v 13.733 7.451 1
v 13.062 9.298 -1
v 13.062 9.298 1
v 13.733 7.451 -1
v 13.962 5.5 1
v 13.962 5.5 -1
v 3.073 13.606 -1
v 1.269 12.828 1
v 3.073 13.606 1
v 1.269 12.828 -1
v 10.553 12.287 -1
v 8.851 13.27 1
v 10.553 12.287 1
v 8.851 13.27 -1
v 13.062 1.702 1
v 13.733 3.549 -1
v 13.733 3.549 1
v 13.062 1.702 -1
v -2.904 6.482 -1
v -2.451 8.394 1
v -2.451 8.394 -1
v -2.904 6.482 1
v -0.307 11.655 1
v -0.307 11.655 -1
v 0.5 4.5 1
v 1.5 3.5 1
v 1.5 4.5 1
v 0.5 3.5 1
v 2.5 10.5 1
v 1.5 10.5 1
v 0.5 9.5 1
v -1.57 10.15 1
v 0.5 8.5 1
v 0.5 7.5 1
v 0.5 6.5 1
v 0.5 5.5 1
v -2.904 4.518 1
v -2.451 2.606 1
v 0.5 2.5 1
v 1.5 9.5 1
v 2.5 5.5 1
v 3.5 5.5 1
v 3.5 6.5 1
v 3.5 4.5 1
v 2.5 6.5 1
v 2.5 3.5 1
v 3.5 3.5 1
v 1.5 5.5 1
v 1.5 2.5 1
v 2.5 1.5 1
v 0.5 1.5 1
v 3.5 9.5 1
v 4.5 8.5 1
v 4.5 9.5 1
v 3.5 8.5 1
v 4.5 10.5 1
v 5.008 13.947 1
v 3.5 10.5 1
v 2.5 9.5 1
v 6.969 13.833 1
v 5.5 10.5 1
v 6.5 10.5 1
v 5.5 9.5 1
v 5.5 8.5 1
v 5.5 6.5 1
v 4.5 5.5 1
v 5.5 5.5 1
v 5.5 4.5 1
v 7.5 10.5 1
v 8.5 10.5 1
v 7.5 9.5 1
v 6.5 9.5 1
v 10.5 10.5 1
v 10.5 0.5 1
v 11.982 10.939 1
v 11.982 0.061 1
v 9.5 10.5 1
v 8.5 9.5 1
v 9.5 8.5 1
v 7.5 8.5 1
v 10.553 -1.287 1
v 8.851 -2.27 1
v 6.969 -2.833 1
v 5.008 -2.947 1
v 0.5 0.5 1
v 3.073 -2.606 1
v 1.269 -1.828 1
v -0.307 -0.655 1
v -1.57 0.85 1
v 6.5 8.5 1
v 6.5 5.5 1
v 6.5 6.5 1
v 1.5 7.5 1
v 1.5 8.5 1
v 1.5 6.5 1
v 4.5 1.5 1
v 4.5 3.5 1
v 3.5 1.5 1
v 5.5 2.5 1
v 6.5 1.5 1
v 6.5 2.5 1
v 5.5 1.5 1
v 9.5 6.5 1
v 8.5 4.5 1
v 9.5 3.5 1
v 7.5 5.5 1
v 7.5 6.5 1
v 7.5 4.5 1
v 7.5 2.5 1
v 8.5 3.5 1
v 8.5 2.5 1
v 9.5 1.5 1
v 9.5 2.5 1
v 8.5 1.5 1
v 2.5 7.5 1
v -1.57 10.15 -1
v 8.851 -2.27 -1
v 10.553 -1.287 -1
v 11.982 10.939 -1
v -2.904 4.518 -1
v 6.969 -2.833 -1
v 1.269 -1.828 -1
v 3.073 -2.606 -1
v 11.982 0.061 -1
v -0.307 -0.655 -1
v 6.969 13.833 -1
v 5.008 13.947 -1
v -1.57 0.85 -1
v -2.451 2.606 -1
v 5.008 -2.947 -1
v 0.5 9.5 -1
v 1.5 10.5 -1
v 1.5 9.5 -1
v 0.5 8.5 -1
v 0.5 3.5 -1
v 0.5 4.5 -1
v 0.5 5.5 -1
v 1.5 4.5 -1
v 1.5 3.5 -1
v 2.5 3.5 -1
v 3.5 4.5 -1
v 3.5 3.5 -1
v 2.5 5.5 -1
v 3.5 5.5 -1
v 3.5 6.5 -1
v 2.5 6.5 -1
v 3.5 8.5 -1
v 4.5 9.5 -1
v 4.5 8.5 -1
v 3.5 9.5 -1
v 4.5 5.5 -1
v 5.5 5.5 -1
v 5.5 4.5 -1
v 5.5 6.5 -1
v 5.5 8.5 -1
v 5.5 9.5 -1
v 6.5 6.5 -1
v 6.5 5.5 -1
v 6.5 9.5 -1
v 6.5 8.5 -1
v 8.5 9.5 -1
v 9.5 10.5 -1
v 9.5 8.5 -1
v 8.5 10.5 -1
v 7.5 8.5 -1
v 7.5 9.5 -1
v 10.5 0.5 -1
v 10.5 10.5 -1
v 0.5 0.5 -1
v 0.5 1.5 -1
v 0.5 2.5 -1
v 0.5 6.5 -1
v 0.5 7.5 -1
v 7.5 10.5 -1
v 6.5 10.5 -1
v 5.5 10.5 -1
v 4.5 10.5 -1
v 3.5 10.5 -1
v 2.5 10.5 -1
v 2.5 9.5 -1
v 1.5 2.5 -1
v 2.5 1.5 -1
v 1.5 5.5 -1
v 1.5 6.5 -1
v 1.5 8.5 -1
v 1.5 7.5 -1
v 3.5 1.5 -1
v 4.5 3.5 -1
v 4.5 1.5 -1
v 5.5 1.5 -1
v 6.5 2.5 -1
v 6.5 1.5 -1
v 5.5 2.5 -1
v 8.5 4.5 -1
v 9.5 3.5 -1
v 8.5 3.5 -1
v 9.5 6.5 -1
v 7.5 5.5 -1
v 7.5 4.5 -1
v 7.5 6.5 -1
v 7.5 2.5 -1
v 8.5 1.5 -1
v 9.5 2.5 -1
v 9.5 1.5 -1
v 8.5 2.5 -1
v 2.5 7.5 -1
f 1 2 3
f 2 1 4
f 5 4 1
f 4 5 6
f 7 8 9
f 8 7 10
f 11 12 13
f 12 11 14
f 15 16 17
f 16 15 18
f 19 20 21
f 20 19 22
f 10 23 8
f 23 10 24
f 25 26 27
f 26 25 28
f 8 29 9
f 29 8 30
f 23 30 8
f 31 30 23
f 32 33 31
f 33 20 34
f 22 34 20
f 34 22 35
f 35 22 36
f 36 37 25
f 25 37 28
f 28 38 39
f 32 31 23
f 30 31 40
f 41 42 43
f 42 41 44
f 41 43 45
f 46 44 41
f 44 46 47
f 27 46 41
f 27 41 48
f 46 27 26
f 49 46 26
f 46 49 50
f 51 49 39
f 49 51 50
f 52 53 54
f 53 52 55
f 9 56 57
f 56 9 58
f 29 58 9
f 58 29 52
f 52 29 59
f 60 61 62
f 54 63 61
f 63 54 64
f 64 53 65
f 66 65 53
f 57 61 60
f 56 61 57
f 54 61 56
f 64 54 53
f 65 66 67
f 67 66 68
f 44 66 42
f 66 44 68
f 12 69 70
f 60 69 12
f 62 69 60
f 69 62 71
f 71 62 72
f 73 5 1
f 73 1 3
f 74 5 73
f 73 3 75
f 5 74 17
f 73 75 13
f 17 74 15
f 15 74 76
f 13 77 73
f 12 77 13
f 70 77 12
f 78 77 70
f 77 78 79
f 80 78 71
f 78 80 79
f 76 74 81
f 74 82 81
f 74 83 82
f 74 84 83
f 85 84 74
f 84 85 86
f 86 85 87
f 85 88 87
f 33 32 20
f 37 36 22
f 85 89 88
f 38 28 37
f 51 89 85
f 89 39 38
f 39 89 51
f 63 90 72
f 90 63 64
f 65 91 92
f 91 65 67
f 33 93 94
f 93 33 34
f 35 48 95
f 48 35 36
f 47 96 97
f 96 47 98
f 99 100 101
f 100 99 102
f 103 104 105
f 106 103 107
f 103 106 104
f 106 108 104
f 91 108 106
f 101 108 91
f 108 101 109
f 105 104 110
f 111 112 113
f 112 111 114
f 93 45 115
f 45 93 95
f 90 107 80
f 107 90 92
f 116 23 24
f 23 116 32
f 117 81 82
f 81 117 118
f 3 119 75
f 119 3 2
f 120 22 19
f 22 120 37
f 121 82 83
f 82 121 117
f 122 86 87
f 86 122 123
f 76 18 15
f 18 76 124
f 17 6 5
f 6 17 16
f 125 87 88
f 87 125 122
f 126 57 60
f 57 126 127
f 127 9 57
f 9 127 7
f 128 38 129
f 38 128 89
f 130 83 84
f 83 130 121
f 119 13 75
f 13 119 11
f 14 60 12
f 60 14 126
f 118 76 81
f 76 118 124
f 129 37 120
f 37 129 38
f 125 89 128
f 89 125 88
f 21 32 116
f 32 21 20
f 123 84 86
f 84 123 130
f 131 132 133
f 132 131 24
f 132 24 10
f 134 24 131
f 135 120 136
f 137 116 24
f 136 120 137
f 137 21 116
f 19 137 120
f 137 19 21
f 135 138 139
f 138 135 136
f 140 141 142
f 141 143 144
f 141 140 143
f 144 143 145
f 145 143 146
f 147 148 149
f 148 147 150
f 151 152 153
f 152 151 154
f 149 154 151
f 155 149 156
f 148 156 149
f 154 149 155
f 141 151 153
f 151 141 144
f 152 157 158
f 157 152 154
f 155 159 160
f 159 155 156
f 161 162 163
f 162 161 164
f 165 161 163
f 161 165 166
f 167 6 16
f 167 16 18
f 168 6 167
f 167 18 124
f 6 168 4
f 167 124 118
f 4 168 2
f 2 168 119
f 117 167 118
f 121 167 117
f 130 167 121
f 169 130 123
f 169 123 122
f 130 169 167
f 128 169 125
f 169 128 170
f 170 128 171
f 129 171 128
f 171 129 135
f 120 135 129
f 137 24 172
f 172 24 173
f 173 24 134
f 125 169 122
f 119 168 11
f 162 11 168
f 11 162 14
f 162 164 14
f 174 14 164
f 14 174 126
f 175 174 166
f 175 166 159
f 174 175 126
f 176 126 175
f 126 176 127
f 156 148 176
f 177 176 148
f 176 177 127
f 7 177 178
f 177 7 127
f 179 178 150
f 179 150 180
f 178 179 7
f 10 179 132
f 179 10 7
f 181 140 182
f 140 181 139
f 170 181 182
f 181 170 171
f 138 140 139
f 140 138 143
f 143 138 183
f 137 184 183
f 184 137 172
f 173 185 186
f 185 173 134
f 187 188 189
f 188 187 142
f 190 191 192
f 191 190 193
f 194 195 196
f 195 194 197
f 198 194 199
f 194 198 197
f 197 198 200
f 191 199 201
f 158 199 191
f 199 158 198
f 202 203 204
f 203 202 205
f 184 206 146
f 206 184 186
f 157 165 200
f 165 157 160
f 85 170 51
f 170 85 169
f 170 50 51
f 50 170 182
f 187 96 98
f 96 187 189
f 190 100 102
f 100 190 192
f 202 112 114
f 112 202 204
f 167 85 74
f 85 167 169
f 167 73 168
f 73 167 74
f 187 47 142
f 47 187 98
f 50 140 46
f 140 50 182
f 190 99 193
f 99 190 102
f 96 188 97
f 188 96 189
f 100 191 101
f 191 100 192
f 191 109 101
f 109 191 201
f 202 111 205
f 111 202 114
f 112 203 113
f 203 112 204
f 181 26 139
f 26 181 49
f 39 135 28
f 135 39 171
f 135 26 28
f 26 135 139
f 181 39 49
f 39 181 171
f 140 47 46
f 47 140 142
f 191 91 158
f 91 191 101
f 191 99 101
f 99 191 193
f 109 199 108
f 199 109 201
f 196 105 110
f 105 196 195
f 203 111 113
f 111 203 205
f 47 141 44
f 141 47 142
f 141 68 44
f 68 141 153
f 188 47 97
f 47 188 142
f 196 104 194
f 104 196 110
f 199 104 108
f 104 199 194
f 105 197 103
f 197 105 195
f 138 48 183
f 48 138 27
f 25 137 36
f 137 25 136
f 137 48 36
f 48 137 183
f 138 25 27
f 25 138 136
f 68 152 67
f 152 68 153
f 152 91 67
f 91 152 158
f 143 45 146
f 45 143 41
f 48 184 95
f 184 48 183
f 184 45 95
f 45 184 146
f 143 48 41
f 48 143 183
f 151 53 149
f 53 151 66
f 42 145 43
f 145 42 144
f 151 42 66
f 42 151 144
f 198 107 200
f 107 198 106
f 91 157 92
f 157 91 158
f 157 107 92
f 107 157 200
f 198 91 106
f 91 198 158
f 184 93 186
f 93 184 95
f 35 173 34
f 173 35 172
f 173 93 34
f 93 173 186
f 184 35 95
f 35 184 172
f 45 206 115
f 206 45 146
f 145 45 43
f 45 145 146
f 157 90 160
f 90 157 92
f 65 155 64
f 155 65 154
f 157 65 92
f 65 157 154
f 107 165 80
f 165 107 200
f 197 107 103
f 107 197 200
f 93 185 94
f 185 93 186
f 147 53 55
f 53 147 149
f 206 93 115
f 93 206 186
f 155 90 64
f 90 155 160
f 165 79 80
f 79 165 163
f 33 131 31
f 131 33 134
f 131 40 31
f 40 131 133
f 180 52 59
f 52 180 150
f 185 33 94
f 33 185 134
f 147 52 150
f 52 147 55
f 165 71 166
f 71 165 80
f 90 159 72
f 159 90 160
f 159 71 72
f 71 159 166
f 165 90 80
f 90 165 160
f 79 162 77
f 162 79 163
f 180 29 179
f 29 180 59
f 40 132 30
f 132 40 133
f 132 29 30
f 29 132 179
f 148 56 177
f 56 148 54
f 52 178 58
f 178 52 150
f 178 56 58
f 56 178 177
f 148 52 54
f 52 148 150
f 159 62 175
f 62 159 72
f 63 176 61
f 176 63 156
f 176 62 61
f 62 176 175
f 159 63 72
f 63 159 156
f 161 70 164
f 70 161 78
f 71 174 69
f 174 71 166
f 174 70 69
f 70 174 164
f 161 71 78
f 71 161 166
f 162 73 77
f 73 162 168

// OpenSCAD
rotate([0,0,0])difference(){translate([5.5,5.5,0])  cylinder(r=8.46153846153846,h=2, center=true);
translate([1,1,0])  cube(size = [1,1,2], center=true);
translate([2,1,0])  cube(size = [1,1,2], center=true);
translate([3,1,0])  cube(size = [1,1,2], center=true);
translate([4,1,0])  cube(size = [1,1,2], center=true);
translate([5,1,0])  cube(size = [1,1,2], center=true);
translate([6,1,0])  cube(size = [1,1,2], center=true);
translate([7,1,0])  cube(size = [1,1,2], center=true);
translate([8,1,0])  cube(size = [1,1,2], center=true);
translate([9,1,0])  cube(size = [1,1,2], center=true);
translate([10,1,0])  cube(size = [1,1,2], center=true);
translate([10,1,0])  cube(size = [1,1,2], center=true);
translate([10,1,0])  cube(size = [1,1,2], center=true);
translate([3,2,0])  cube(size = [1,1,2], center=true);
translate([3,2,0])  cube(size = [1,1,2], center=true);
translate([5,2,0])  cube(size = [1,1,2], center=true);
translate([5,2,0])  cube(size = [1,1,2], center=true);
translate([7,2,0])  cube(size = [1,1,2], center=true);
translate([8,2,0])  cube(size = [1,1,2], center=true);
translate([8,2,0])  cube(size = [1,1,2], center=true);
translate([10,2,0])  cube(size = [1,1,2], center=true);
translate([1,3,0])  cube(size = [1,1,2], center=true);
translate([1,3,0])  cube(size = [1,1,2], center=true);
translate([3,3,0])  cube(size = [1,1,2], center=true);
translate([3,3,0])  cube(size = [1,1,2], center=true);
translate([5,3,0])  cube(size = [1,1,2], center=true);
translate([6,3,0])  cube(size = [1,1,2], center=true);
translate([6,3,0])  cube(size = [1,1,2], center=true);
translate([8,3,0])  cube(size = [1,1,2], center=true);
translate([9,3,0])  cube(size = [1,1,2], center=true);
translate([10,3,0])  cube(size = [1,1,2], center=true);
translate([10,3,0])  cube(size = [1,1,2], center=true);
translate([10,3,0])  cube(size = [1,1,2], center=true);
translate([10,3,0])  cube(size = [1,1,2], center=true);
translate([4,4,0])  cube(size = [1,1,2], center=true);
translate([5,4,0])  cube(size = [1,1,2], center=true);
translate([6,4,0])  cube(size = [1,1,2], center=true);
translate([6,4,0])  cube(size = [1,1,2], center=true);
translate([8,4,0])  cube(size = [1,1,2], center=true);
translate([8,4,0])  cube(size = [1,1,2], center=true);
translate([10,4,0])  cube(size = [1,1,2], center=true);
translate([1,5,0])  cube(size = [1,1,2], center=true);
translate([1,5,0])  cube(size = [1,1,2], center=true);
translate([1,5,0])  cube(size = [1,1,2], center=true);
translate([1,5,0])  cube(size = [1,1,2], center=true);
translate([1,5,0])  cube(size = [1,1,2], center=true);
translate([6,5,0])  cube(size = [1,1,2], center=true);
translate([6,5,0])  cube(size = [1,1,2], center=true);
translate([6,5,0])  cube(size = [1,1,2], center=true);
translate([6,5,0])  cube(size = [1,1,2], center=true);
translate([10,5,0])  cube(size = [1,1,2], center=true);
translate([10,5,0])  cube(size = [1,1,2], center=true);
translate([2,6,0])  cube(size = [1,1,2], center=true);
translate([2,6,0])  cube(size = [1,1,2], center=true);
translate([4,6,0])  cube(size = [1,1,2], center=true);
translate([4,6,0])  cube(size = [1,1,2], center=true);
translate([4,6,0])  cube(size = [1,1,2], center=true);
translate([7,6,0])  cube(size = [1,1,2], center=true);
translate([7,6,0])  cube(size = [1,1,2], center=true);
translate([7,6,0])  cube(size = [1,1,2], center=true);
translate([10,6,0])  cube(size = [1,1,2], center=true);
translate([1,7,0])  cube(size = [1,1,2], center=true);
translate([1,7,0])  cube(size = [1,1,2], center=true);
translate([3,7,0])  cube(size = [1,1,2], center=true);
translate([4,7,0])  cube(size = [1,1,2], center=true);
translate([4,7,0])  cube(size = [1,1,2], center=true);
translate([6,7,0])  cube(size = [1,1,2], center=true);
translate([6,7,0])  cube(size = [1,1,2], center=true);
translate([8,7,0])  cube(size = [1,1,2], center=true);
translate([9,7,0])  cube(size = [1,1,2], center=true);
translate([10,7,0])  cube(size = [1,1,2], center=true);
translate([10,7,0])  cube(size = [1,1,2], center=true);
translate([2,8,0])  cube(size = [1,1,2], center=true);
translate([3,8,0])  cube(size = [1,1,2], center=true);
translate([4,8,0])  cube(size = [1,1,2], center=true);
translate([4,8,0])  cube(size = [1,1,2], center=true);
translate([6,8,0])  cube(size = [1,1,2], center=true);
translate([6,8,0])  cube(size = [1,1,2], center=true);
translate([8,8,0])  cube(size = [1,1,2], center=true);
translate([9,8,0])  cube(size = [1,1,2], center=true);
translate([10,8,0])  cube(size = [1,1,2], center=true);
translate([1,9,0])  cube(size = [1,1,2], center=true);
translate([2,9,0])  cube(size = [1,1,2], center=true);
translate([3,9,0])  cube(size = [1,1,2], center=true);
translate([3,9,0])  cube(size = [1,1,2], center=true);
translate([3,9,0])  cube(size = [1,1,2], center=true);
translate([3,9,0])  cube(size = [1,1,2], center=true);
translate([7,9,0])  cube(size = [1,1,2], center=true);
translate([7,9,0])  cube(size = [1,1,2], center=true);
translate([7,9,0])  cube(size = [1,1,2], center=true);
translate([10,9,0])  cube(size = [1,1,2], center=true);
translate([10,9,0])  cube(size = [1,1,2], center=true);
translate([2,10,0])  cube(size = [1,1,2], center=true);
translate([2,10,0])  cube(size = [1,1,2], center=true);
translate([4,10,0])  cube(size = [1,1,2], center=true);
translate([4,10,0])  cube(size = [1,1,2], center=true);
translate([6,10,0])  cube(size = [1,1,2], center=true);
translate([6,10,0])  cube(size = [1,1,2], center=true);
translate([8,10,0])  cube(size = [1,1,2], center=true);
translate([8,10,0])  cube(size = [1,1,2], center=true);
translate([10,10,0])  cube(size = [1,1,2], center=true);
}
